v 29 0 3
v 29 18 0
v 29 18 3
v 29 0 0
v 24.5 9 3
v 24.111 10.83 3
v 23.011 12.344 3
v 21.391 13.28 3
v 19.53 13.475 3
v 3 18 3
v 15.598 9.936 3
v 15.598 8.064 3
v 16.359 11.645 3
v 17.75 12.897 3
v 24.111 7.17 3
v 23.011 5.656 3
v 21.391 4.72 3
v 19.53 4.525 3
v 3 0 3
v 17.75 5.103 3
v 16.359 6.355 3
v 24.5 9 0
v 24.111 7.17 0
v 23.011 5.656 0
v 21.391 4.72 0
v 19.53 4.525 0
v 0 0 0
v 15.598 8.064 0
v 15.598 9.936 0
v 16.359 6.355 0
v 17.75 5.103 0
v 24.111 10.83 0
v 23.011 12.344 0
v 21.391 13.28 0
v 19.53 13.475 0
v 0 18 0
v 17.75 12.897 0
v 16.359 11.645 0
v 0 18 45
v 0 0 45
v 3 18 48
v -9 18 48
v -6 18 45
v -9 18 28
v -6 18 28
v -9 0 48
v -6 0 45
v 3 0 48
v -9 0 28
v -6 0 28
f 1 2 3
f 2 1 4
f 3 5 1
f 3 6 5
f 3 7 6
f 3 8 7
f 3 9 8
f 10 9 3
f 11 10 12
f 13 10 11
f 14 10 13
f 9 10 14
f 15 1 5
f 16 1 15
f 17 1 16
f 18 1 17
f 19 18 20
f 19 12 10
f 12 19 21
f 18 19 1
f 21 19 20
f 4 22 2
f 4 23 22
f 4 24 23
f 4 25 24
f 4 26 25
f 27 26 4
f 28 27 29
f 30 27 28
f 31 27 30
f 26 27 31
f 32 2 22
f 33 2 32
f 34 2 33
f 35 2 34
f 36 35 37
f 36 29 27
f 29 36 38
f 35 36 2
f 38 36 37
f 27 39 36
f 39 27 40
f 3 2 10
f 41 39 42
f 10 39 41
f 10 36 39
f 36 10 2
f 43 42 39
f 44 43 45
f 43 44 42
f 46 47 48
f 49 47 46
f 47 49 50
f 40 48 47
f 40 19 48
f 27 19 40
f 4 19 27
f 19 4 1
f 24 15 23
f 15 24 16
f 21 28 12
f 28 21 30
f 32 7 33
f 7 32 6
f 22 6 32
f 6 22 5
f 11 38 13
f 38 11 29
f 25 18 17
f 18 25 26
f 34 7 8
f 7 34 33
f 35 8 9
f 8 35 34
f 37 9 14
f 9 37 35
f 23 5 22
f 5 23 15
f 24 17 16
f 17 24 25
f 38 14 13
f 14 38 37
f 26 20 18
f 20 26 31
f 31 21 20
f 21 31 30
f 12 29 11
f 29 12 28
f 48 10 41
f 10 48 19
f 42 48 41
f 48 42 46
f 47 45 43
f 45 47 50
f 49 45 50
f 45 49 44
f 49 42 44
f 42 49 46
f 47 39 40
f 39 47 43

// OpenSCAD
filter_wall=6;
holder_wall=3;
offset_v=45;
offset_h=20;
hole=9;
cube([holder_wall,2*hole,offset_v+holder_wall]);
tail=min(20,offset_v+holder_wall);
translate([-holder_wall-filter_wall,0,offset_v+holder_wall-tail])cube([holder_wall,2*hole,tail]);
translate([-filter_wall,0,offset_v])cube([filter_wall,2*hole,holder_wall]);
difference() {
cube([offset_h+hole ,2*hole,holder_wall]);
translate([offset_h,hole,holder_wall/2])cylinder(h=holder_wall+0.02,d=hole,center=true);
}
